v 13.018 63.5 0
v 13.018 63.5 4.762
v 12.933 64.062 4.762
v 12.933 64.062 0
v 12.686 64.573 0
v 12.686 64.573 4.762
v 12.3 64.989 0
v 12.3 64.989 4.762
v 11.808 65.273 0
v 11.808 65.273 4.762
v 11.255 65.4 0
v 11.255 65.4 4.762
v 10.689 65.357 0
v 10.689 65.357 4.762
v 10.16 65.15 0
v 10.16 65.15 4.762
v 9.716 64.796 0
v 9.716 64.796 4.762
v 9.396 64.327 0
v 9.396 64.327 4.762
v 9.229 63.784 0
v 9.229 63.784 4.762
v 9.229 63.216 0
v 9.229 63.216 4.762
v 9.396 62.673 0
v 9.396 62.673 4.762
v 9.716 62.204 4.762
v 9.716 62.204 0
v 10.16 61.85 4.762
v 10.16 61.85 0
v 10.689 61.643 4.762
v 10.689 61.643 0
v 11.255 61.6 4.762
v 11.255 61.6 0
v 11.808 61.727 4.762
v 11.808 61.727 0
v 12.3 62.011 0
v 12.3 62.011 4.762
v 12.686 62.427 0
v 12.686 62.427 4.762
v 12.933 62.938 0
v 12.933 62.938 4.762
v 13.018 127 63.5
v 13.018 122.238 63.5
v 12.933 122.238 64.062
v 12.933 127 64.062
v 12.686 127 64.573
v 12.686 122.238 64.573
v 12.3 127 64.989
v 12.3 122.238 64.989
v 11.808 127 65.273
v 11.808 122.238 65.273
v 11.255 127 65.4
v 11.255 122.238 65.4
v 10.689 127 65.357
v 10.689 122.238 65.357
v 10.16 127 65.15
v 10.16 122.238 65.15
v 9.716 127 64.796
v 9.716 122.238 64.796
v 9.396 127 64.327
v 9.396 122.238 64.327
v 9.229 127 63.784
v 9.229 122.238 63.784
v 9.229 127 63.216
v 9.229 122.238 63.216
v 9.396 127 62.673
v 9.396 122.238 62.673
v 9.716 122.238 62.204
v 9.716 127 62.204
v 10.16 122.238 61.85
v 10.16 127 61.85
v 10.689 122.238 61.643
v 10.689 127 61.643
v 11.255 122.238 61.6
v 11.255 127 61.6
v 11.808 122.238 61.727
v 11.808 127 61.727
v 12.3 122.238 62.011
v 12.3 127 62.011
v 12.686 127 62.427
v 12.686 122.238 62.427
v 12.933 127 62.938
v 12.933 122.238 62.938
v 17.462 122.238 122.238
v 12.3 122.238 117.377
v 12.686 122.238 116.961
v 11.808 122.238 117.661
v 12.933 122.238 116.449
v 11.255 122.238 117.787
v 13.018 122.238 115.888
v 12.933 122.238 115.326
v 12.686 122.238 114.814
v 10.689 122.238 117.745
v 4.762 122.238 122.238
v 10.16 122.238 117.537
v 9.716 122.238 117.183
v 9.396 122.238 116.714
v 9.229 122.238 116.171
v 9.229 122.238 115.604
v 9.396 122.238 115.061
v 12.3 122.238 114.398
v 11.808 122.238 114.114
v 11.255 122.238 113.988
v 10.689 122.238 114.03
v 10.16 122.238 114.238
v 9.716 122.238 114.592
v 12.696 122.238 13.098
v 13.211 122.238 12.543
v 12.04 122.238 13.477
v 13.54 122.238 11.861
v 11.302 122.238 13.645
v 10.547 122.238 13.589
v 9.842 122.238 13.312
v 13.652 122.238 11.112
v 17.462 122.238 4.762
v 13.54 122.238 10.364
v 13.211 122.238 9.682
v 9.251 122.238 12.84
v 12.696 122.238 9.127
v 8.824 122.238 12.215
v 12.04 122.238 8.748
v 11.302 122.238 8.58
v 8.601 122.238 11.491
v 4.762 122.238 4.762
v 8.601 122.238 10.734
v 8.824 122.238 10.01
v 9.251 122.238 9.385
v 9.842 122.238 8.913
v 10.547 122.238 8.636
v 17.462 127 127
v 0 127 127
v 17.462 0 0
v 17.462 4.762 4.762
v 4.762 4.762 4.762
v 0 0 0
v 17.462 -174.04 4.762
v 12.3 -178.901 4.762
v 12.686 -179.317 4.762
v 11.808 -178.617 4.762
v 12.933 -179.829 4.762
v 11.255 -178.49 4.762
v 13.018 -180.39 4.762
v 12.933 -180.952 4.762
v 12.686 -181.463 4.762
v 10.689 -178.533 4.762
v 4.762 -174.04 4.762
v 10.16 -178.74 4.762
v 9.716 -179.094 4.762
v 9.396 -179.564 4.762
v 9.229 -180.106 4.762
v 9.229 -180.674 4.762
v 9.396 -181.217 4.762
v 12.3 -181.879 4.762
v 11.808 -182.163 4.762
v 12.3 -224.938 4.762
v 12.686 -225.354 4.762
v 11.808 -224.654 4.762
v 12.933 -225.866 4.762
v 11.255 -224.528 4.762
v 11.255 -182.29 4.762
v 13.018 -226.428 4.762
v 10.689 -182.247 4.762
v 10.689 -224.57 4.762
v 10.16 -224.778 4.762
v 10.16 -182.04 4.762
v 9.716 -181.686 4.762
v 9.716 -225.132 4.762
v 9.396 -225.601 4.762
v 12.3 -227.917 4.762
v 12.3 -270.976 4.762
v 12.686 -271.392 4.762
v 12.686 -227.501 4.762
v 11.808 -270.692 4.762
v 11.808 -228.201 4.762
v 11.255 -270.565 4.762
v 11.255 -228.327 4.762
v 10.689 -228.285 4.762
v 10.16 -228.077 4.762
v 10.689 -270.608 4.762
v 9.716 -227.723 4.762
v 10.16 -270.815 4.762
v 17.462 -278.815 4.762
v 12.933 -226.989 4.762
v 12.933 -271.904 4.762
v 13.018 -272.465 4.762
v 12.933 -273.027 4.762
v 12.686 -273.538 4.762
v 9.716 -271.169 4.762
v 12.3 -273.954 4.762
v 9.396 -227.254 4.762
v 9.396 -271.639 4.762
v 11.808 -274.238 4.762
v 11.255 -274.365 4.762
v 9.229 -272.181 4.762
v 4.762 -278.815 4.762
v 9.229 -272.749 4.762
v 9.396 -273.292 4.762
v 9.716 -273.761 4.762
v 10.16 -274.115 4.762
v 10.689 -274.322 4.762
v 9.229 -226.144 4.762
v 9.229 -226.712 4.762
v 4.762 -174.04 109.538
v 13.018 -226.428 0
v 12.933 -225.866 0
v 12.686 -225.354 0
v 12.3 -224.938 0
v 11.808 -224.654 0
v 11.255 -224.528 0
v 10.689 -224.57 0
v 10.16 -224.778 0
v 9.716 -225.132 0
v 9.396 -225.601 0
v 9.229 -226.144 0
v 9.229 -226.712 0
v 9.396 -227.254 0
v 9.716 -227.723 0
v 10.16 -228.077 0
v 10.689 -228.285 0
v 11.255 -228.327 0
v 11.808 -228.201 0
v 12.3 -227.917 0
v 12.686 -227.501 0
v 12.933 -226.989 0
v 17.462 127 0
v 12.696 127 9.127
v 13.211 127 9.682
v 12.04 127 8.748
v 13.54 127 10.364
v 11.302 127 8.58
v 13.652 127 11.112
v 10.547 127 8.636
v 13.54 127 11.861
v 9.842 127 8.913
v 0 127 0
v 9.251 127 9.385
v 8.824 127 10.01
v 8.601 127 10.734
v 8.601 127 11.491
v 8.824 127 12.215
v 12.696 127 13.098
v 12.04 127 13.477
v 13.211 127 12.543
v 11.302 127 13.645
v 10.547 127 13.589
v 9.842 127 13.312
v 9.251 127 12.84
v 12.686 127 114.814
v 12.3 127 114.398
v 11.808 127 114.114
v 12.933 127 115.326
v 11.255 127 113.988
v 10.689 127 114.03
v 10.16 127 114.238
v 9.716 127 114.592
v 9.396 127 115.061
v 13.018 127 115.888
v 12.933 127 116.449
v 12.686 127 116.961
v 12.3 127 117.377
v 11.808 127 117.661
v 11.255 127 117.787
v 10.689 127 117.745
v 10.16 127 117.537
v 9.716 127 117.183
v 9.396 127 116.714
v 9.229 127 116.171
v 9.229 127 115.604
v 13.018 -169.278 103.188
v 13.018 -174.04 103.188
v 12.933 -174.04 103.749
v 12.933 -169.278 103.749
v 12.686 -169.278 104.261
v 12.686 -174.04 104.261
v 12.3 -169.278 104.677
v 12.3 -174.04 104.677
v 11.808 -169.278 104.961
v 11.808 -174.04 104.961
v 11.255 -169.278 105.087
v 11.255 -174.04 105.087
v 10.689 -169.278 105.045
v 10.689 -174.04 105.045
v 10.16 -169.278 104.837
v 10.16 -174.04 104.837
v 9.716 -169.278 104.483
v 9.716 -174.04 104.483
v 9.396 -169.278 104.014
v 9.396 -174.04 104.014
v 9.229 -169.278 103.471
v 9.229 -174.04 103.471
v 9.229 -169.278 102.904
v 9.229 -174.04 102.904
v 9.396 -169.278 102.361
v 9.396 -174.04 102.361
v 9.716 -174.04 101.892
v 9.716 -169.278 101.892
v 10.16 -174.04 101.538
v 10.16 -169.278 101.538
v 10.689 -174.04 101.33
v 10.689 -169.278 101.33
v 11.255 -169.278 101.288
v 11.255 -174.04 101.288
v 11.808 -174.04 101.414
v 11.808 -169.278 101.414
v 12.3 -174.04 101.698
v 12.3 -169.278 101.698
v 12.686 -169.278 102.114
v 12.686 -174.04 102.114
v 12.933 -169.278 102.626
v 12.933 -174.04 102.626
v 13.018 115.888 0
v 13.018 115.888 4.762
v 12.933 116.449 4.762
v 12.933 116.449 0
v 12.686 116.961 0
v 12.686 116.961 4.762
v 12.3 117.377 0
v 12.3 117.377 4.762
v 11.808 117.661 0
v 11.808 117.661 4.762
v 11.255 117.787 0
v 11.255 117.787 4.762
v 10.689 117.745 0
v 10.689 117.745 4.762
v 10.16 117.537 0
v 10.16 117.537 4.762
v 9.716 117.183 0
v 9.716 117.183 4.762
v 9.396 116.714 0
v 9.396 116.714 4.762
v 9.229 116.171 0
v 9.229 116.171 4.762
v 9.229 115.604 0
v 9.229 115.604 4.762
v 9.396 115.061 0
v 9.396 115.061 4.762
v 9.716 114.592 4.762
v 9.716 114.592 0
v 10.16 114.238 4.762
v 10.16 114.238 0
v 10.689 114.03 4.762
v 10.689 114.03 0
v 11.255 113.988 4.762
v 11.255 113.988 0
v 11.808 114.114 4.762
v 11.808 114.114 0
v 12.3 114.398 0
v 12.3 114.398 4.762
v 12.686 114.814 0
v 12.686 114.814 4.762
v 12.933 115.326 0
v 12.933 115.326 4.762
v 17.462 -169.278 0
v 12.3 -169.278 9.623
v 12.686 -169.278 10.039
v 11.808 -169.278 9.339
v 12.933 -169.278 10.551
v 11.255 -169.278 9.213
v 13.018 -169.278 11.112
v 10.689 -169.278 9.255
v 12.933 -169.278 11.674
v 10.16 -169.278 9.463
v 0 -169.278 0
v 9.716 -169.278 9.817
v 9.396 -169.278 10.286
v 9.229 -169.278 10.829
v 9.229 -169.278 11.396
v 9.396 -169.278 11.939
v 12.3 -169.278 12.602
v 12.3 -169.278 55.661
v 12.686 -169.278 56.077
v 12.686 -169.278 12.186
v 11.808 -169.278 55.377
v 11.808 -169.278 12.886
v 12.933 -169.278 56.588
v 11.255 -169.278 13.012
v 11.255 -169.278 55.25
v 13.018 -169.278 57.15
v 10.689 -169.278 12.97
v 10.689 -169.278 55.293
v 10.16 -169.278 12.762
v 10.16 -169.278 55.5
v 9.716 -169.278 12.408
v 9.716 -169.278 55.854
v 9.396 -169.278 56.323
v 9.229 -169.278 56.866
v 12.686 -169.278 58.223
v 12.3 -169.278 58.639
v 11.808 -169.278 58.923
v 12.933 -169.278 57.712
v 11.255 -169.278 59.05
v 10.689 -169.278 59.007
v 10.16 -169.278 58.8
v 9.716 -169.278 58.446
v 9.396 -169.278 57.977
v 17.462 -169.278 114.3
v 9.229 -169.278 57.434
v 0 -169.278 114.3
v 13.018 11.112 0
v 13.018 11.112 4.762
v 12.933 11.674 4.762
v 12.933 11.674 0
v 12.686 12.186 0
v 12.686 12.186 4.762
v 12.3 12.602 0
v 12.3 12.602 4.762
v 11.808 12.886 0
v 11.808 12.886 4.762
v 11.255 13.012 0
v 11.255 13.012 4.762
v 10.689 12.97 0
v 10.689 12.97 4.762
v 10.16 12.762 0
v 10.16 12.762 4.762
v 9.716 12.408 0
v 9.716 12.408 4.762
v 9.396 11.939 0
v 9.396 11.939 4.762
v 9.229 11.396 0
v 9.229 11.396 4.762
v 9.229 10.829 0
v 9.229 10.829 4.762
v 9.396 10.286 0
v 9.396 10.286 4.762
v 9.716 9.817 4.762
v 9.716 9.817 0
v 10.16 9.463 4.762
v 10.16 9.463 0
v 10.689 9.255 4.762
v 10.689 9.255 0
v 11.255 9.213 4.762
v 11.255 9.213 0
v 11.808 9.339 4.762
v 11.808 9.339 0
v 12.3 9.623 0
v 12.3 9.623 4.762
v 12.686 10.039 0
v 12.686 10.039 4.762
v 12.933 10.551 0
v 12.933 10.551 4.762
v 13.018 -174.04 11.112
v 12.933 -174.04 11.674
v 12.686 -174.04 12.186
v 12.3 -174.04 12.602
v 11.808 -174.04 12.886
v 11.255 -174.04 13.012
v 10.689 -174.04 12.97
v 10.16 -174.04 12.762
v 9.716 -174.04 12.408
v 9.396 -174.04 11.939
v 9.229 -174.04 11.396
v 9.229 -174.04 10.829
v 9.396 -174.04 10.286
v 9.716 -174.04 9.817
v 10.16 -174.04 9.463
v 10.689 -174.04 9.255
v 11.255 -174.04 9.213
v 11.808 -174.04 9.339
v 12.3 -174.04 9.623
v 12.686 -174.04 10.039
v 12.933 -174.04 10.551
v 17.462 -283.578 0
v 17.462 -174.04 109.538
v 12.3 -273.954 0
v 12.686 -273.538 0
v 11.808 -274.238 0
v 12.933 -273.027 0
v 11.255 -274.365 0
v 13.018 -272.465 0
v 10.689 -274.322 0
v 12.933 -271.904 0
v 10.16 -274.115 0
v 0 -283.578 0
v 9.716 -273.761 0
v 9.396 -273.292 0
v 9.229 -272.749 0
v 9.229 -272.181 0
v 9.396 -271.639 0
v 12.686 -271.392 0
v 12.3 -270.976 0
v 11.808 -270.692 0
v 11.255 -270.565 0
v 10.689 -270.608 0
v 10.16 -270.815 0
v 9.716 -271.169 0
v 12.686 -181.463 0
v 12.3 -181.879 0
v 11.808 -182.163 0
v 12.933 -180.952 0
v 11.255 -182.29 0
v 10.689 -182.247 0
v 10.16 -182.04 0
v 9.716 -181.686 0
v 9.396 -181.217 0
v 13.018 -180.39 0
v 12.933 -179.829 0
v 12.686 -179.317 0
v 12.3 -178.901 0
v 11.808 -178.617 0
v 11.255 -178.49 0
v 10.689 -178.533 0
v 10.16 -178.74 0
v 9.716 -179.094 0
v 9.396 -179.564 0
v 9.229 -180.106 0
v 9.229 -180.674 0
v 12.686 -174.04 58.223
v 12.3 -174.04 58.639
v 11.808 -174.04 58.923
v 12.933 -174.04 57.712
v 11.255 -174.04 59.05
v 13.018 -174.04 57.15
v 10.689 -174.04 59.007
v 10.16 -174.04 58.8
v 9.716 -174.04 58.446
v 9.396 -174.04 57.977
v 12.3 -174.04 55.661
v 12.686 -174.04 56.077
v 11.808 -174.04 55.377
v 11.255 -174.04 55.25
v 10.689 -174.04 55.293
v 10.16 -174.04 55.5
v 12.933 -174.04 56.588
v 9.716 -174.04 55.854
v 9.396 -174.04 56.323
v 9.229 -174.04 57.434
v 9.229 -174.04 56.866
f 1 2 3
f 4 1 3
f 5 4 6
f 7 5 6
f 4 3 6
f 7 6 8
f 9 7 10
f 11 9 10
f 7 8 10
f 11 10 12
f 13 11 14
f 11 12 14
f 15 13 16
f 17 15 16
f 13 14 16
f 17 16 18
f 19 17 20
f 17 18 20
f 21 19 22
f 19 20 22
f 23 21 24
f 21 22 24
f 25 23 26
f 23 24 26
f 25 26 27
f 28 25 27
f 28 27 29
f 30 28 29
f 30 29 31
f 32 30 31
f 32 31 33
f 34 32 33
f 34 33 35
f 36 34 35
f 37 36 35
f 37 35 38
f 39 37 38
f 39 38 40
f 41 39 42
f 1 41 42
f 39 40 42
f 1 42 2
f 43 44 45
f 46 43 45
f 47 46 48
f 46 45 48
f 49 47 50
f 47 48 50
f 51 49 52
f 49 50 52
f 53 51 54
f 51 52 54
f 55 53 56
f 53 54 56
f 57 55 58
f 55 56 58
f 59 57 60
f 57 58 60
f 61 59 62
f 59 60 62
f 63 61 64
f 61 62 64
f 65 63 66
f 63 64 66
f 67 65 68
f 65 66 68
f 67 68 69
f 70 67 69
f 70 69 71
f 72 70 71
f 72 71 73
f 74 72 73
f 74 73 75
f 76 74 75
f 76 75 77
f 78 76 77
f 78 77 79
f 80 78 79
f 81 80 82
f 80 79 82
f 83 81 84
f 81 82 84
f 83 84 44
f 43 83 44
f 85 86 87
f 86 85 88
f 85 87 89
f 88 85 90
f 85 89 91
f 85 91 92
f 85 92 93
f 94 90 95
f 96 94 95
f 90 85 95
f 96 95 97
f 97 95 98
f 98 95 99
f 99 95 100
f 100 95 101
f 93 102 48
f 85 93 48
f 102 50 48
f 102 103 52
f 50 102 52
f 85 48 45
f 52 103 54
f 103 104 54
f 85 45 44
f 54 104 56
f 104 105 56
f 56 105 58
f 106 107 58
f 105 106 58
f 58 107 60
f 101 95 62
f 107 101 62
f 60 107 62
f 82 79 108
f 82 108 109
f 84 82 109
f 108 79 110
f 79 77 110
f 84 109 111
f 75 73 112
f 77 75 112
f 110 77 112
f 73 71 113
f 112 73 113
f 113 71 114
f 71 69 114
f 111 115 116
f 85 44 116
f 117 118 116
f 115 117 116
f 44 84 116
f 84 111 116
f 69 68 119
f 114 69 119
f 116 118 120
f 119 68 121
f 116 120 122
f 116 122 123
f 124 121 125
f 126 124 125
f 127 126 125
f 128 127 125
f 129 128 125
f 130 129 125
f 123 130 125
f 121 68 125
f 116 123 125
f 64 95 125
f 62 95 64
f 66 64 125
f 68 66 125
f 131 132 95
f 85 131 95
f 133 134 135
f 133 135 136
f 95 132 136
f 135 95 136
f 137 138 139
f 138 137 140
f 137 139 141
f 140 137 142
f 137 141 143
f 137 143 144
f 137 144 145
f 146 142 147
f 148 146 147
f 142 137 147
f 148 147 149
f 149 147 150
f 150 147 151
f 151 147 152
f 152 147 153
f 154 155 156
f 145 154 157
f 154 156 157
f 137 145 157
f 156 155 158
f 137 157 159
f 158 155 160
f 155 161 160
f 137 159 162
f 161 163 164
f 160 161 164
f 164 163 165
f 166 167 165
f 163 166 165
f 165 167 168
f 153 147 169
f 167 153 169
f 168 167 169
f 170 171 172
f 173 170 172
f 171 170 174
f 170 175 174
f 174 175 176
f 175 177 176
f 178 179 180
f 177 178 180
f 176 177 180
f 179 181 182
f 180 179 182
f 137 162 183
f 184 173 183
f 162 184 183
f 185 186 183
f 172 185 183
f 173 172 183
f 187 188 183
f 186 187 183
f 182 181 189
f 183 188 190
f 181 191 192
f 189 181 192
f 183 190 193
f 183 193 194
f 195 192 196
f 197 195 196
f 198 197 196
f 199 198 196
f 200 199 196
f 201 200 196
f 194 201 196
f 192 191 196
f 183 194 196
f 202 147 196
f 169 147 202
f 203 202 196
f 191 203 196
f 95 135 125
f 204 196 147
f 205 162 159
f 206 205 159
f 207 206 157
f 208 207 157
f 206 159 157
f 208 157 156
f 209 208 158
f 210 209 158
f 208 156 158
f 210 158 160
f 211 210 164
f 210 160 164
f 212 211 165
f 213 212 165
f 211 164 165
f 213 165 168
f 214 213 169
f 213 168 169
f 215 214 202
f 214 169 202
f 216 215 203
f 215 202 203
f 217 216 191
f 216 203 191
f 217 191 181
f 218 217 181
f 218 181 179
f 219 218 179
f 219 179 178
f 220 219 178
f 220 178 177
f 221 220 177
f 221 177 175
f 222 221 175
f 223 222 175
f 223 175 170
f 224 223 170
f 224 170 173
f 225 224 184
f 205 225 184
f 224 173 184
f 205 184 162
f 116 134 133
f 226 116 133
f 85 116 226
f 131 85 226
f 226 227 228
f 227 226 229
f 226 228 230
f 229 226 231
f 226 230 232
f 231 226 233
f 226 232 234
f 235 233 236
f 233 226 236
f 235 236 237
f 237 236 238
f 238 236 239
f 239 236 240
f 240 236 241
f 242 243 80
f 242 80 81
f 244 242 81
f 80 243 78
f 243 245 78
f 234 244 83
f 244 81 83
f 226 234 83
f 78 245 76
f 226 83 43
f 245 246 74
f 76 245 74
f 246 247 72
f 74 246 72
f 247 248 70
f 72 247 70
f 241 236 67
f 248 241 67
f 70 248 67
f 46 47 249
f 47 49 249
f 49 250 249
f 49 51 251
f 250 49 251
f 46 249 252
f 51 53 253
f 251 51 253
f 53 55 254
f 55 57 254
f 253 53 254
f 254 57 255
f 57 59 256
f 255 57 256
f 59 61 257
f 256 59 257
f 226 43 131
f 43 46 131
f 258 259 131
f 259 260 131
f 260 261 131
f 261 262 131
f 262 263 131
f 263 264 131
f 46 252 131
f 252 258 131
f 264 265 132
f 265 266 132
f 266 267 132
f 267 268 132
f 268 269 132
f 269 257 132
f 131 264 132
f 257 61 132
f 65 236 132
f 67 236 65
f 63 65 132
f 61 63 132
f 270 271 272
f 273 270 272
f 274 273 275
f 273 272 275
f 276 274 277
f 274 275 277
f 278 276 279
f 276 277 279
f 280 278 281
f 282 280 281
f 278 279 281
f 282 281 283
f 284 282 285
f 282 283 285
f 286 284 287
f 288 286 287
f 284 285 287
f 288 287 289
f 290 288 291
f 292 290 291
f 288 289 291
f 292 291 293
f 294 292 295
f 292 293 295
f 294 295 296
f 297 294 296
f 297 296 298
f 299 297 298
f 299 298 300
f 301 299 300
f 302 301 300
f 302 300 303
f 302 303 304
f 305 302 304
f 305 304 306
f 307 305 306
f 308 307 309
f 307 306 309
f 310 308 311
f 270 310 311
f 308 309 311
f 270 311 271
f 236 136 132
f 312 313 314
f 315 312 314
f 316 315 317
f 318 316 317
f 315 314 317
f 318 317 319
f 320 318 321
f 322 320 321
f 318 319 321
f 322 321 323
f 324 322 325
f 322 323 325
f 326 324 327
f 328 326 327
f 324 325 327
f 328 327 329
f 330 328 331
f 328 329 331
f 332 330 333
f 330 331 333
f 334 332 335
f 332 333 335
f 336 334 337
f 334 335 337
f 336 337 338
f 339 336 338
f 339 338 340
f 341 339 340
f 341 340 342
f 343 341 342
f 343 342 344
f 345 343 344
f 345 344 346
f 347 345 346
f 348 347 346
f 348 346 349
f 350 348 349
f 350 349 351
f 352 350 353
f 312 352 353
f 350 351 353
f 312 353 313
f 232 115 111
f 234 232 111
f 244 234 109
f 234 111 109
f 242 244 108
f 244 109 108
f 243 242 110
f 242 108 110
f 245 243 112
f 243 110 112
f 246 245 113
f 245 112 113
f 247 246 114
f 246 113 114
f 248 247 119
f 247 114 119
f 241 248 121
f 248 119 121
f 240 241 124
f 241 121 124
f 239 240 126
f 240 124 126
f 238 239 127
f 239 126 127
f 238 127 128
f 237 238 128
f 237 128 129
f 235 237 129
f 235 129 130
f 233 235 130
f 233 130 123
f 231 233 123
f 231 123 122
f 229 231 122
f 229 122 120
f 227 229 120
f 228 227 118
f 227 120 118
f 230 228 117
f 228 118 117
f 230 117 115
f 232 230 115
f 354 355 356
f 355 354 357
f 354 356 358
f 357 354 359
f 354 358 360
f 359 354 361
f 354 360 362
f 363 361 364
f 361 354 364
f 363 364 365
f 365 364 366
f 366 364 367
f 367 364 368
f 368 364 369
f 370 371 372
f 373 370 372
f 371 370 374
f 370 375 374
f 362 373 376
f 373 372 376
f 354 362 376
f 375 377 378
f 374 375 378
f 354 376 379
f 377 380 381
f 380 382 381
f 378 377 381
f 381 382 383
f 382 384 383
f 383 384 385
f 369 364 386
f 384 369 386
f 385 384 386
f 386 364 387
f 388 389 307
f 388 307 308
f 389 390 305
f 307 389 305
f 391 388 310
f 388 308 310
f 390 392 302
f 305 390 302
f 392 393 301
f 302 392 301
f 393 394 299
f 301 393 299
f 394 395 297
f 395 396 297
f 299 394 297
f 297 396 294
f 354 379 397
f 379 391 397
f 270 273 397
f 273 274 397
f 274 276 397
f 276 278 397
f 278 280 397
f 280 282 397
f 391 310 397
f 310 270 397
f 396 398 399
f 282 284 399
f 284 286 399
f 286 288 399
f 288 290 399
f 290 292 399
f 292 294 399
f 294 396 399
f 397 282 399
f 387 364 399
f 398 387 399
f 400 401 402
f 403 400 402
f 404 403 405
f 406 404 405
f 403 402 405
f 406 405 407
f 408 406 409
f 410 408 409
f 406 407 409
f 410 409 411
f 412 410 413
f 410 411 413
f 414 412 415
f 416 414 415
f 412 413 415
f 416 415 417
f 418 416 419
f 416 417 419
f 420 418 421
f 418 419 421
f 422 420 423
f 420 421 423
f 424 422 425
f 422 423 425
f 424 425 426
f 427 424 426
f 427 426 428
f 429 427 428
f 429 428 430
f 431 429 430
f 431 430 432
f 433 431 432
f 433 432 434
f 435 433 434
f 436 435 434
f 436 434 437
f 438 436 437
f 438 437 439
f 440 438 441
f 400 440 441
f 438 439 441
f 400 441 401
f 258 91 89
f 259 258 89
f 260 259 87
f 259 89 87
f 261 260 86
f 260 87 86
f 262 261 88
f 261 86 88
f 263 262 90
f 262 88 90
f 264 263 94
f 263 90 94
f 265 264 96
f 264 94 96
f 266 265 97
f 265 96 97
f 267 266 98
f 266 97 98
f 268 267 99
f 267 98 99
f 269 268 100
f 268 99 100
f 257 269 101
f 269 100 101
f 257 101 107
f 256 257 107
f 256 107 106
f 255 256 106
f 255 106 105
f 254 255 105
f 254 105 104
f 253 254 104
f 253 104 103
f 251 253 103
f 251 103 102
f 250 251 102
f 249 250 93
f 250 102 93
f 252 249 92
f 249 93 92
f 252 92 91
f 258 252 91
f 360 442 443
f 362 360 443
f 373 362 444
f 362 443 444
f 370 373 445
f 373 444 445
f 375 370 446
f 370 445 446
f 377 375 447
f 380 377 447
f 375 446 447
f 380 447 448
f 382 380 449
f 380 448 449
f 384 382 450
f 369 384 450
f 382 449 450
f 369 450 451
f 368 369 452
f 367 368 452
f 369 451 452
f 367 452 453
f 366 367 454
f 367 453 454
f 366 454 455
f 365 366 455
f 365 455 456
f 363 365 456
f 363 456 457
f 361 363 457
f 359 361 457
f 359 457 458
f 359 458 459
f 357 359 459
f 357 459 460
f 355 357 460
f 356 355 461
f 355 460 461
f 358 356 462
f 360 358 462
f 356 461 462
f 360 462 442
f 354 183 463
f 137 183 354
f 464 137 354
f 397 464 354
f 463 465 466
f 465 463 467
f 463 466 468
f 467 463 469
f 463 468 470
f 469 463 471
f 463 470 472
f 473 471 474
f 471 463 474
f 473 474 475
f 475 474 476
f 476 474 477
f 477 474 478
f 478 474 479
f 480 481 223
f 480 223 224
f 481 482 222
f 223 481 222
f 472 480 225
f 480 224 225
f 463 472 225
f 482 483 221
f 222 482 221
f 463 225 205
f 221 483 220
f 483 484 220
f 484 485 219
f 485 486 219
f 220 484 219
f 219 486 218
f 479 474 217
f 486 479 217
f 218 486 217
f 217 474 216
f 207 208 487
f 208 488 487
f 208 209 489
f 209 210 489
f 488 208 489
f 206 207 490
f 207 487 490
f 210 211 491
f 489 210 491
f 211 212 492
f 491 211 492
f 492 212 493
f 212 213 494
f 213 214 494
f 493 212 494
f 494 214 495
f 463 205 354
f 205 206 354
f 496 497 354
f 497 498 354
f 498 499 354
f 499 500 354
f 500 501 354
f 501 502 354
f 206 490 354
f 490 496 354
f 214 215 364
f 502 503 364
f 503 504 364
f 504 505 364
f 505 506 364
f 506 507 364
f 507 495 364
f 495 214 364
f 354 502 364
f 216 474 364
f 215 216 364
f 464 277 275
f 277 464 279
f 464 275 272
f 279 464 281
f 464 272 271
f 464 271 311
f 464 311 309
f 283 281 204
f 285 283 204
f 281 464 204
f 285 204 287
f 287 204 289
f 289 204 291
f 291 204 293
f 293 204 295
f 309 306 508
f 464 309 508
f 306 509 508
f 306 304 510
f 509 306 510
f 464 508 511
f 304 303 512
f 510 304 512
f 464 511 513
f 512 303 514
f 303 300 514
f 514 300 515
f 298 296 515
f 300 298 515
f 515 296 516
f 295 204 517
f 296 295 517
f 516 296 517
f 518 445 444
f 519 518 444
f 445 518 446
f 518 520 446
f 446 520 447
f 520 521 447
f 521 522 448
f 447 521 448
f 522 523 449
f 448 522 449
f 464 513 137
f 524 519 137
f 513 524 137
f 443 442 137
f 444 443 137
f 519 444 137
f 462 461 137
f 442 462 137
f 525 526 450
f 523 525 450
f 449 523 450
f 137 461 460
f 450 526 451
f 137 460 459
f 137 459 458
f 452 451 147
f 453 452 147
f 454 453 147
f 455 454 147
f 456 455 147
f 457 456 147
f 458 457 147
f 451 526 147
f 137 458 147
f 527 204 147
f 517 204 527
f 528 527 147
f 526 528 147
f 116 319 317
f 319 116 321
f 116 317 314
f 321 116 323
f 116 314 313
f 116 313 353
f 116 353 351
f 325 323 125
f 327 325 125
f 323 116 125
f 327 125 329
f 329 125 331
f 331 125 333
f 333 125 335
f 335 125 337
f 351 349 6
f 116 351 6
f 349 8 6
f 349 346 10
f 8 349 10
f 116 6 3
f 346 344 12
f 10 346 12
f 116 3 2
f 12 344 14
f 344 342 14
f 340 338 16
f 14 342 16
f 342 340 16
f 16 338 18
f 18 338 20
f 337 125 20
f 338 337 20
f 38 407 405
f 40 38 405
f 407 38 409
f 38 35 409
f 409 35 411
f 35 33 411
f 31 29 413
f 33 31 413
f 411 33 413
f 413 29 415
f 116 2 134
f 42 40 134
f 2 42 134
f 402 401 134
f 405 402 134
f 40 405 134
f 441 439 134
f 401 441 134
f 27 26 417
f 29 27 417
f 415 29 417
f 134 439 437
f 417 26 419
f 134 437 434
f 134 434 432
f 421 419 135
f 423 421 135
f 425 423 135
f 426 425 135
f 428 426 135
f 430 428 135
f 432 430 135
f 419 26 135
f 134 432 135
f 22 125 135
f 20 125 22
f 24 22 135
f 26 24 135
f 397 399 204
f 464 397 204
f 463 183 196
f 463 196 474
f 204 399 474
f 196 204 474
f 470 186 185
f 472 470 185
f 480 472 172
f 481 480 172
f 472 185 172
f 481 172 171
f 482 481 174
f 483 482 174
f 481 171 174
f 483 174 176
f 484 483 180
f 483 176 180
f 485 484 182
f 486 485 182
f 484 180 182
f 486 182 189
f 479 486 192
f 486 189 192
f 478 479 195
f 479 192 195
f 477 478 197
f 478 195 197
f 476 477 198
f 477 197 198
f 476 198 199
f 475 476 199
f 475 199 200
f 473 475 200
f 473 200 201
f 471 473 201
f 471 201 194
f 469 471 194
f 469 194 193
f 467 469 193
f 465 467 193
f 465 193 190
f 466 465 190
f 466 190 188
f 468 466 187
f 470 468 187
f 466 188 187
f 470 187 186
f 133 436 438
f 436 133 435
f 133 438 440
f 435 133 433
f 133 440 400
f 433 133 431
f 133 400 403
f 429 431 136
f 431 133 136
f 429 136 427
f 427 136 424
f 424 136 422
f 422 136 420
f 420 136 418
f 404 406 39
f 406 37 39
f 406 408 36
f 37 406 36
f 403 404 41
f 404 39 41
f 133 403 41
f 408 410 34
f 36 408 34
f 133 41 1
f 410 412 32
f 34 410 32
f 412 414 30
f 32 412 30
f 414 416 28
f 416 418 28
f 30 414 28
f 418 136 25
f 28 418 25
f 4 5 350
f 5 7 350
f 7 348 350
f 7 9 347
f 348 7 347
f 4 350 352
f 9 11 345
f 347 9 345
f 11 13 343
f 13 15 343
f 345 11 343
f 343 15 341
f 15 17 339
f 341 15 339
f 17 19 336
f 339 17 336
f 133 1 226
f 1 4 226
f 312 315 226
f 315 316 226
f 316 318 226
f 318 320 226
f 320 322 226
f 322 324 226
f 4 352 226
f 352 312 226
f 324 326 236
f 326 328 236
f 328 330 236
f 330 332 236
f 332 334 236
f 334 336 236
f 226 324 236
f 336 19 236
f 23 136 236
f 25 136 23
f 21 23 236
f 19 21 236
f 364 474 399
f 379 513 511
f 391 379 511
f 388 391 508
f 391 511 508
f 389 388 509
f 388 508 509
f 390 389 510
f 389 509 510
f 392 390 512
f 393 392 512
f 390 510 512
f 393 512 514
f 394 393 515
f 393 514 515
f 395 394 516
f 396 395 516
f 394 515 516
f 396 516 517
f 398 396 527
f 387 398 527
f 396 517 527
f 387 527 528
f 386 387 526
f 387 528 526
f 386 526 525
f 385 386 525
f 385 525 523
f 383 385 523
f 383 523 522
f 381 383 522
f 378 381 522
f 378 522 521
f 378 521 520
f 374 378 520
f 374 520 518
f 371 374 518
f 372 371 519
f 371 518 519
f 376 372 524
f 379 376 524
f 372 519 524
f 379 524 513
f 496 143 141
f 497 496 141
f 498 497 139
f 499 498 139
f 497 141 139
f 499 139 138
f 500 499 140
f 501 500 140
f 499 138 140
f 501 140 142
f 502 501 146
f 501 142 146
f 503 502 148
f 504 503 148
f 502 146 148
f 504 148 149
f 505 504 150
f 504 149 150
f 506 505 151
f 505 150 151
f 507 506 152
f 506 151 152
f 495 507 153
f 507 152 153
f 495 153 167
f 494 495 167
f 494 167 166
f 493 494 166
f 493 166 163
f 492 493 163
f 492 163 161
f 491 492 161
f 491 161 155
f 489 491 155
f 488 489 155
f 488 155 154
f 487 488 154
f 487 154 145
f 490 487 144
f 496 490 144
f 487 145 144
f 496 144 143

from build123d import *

# Parameters (mm, degrees)
F1_DEPTH  = 4.7625
F3_DEPTH  = 12.7
F4_R      = 1.905
F5_DEPTH  = 4.7625
F6_R      = 1.905
F6_R_2    = 2.54
F7_DEPTH  = 4.7625
F9_DEPTH  = 4.7625
F11_DEPTH = 12.7
F12_R     = 1.905
F13_DEPTH = 4.7625
F14_R     = 1.905
F15_DEPTH = 4.7625


with BuildPart() as f1:
    # F0 (on Right) → F1 (new body)
    with BuildSketch(Plane.YZ):
        Polygon((127, 127), (0, 0), (127, 0), align=None)
    extrude(amount=F1_DEPTH)

    # F2 (on face) → F3 (join)
    with BuildSketch(Plane.YZ.offset(4.7625)):
        Polygon((122.2375, 4.7625), (127, 4.7625), (127, 127), (122.2375, 122.2375), align=None)
        Polygon((127, 0), (127, 4.7625), (122.2375, 4.7625), (4.7625, 4.7625), (0, 0), align=None)
    extrude(amount=F3_DEPTH)

    # F4 (on face) → F5 (cut, through all)
    with BuildSketch(Plane.XY.offset(4.7625)):
        with Locations((11.1125, 11.1125)):
            Circle(F4_R)
        with Locations((11.1125, 115.8875)):
            Circle(F4_R)
        with Locations((11.1125, 63.5)):
            Circle(F4_R)
    extrude(amount=-F5_DEPTH, mode=Mode.SUBTRACT)

    # F6 (on face) → F7 (cut, through all)
    with BuildSketch(Plane.XZ.offset(-122.2375)):
        with Locations((11.1125, 115.8875)):
            Circle(F6_R)
        with Locations((11.1125, 11.1125)):
            Circle(F6_R_2)
        with Locations((11.1125, 63.5)):
            Circle(F6_R)
    extrude(amount=-F7_DEPTH, mode=Mode.SUBTRACT)


with BuildPart() as f9:
    # F8 (on Right) → F9 (new body)
    with BuildSketch(Plane.YZ):
        Polygon((-169.277602, 114.3), (-283.577602, 0), (-169.277602, 0), align=None)
    extrude(amount=F9_DEPTH)

    # F10 (on face) → F11 (join)
    with BuildSketch(Plane.YZ.offset(4.7625)):
        Polygon((-174.040102, 109.5375), (-174.040102, 4.7625), (-169.277602, 4.7625), (-169.277602, 114.3), align=None)
        Polygon((-174.040102, 4.7625), (-278.815102, 4.7625), (-283.577602, 0), (-169.277602, 0), (-169.277602, 4.7625), align=None)
    extrude(amount=F11_DEPTH)

    # F12 (on face) → F13 (cut, through all)
    with BuildSketch(Plane.XY.offset(4.7625)):
        with Locations((11.1125, -272.465102)):
            Circle(F12_R)
        with Locations((11.1125, -226.427602)):
            Circle(F12_R)
        with Locations((11.1125, -180.390102)):
            Circle(F12_R)
    extrude(amount=-F13_DEPTH, mode=Mode.SUBTRACT)

    # F14 (on face) → F15 (cut, through all)
    with BuildSketch(Plane.XZ.offset(174.040102)):
        with Locations((11.1125, 103.1875)):
            Circle(F14_R)
        with Locations((11.1125, 11.1125)):
            Circle(F14_R)
        with Locations((11.1125, 57.15)):
            Circle(F14_R)
    extrude(amount=-F15_DEPTH, mode=Mode.SUBTRACT)


solid = Compound([f1.part, f9.part])
